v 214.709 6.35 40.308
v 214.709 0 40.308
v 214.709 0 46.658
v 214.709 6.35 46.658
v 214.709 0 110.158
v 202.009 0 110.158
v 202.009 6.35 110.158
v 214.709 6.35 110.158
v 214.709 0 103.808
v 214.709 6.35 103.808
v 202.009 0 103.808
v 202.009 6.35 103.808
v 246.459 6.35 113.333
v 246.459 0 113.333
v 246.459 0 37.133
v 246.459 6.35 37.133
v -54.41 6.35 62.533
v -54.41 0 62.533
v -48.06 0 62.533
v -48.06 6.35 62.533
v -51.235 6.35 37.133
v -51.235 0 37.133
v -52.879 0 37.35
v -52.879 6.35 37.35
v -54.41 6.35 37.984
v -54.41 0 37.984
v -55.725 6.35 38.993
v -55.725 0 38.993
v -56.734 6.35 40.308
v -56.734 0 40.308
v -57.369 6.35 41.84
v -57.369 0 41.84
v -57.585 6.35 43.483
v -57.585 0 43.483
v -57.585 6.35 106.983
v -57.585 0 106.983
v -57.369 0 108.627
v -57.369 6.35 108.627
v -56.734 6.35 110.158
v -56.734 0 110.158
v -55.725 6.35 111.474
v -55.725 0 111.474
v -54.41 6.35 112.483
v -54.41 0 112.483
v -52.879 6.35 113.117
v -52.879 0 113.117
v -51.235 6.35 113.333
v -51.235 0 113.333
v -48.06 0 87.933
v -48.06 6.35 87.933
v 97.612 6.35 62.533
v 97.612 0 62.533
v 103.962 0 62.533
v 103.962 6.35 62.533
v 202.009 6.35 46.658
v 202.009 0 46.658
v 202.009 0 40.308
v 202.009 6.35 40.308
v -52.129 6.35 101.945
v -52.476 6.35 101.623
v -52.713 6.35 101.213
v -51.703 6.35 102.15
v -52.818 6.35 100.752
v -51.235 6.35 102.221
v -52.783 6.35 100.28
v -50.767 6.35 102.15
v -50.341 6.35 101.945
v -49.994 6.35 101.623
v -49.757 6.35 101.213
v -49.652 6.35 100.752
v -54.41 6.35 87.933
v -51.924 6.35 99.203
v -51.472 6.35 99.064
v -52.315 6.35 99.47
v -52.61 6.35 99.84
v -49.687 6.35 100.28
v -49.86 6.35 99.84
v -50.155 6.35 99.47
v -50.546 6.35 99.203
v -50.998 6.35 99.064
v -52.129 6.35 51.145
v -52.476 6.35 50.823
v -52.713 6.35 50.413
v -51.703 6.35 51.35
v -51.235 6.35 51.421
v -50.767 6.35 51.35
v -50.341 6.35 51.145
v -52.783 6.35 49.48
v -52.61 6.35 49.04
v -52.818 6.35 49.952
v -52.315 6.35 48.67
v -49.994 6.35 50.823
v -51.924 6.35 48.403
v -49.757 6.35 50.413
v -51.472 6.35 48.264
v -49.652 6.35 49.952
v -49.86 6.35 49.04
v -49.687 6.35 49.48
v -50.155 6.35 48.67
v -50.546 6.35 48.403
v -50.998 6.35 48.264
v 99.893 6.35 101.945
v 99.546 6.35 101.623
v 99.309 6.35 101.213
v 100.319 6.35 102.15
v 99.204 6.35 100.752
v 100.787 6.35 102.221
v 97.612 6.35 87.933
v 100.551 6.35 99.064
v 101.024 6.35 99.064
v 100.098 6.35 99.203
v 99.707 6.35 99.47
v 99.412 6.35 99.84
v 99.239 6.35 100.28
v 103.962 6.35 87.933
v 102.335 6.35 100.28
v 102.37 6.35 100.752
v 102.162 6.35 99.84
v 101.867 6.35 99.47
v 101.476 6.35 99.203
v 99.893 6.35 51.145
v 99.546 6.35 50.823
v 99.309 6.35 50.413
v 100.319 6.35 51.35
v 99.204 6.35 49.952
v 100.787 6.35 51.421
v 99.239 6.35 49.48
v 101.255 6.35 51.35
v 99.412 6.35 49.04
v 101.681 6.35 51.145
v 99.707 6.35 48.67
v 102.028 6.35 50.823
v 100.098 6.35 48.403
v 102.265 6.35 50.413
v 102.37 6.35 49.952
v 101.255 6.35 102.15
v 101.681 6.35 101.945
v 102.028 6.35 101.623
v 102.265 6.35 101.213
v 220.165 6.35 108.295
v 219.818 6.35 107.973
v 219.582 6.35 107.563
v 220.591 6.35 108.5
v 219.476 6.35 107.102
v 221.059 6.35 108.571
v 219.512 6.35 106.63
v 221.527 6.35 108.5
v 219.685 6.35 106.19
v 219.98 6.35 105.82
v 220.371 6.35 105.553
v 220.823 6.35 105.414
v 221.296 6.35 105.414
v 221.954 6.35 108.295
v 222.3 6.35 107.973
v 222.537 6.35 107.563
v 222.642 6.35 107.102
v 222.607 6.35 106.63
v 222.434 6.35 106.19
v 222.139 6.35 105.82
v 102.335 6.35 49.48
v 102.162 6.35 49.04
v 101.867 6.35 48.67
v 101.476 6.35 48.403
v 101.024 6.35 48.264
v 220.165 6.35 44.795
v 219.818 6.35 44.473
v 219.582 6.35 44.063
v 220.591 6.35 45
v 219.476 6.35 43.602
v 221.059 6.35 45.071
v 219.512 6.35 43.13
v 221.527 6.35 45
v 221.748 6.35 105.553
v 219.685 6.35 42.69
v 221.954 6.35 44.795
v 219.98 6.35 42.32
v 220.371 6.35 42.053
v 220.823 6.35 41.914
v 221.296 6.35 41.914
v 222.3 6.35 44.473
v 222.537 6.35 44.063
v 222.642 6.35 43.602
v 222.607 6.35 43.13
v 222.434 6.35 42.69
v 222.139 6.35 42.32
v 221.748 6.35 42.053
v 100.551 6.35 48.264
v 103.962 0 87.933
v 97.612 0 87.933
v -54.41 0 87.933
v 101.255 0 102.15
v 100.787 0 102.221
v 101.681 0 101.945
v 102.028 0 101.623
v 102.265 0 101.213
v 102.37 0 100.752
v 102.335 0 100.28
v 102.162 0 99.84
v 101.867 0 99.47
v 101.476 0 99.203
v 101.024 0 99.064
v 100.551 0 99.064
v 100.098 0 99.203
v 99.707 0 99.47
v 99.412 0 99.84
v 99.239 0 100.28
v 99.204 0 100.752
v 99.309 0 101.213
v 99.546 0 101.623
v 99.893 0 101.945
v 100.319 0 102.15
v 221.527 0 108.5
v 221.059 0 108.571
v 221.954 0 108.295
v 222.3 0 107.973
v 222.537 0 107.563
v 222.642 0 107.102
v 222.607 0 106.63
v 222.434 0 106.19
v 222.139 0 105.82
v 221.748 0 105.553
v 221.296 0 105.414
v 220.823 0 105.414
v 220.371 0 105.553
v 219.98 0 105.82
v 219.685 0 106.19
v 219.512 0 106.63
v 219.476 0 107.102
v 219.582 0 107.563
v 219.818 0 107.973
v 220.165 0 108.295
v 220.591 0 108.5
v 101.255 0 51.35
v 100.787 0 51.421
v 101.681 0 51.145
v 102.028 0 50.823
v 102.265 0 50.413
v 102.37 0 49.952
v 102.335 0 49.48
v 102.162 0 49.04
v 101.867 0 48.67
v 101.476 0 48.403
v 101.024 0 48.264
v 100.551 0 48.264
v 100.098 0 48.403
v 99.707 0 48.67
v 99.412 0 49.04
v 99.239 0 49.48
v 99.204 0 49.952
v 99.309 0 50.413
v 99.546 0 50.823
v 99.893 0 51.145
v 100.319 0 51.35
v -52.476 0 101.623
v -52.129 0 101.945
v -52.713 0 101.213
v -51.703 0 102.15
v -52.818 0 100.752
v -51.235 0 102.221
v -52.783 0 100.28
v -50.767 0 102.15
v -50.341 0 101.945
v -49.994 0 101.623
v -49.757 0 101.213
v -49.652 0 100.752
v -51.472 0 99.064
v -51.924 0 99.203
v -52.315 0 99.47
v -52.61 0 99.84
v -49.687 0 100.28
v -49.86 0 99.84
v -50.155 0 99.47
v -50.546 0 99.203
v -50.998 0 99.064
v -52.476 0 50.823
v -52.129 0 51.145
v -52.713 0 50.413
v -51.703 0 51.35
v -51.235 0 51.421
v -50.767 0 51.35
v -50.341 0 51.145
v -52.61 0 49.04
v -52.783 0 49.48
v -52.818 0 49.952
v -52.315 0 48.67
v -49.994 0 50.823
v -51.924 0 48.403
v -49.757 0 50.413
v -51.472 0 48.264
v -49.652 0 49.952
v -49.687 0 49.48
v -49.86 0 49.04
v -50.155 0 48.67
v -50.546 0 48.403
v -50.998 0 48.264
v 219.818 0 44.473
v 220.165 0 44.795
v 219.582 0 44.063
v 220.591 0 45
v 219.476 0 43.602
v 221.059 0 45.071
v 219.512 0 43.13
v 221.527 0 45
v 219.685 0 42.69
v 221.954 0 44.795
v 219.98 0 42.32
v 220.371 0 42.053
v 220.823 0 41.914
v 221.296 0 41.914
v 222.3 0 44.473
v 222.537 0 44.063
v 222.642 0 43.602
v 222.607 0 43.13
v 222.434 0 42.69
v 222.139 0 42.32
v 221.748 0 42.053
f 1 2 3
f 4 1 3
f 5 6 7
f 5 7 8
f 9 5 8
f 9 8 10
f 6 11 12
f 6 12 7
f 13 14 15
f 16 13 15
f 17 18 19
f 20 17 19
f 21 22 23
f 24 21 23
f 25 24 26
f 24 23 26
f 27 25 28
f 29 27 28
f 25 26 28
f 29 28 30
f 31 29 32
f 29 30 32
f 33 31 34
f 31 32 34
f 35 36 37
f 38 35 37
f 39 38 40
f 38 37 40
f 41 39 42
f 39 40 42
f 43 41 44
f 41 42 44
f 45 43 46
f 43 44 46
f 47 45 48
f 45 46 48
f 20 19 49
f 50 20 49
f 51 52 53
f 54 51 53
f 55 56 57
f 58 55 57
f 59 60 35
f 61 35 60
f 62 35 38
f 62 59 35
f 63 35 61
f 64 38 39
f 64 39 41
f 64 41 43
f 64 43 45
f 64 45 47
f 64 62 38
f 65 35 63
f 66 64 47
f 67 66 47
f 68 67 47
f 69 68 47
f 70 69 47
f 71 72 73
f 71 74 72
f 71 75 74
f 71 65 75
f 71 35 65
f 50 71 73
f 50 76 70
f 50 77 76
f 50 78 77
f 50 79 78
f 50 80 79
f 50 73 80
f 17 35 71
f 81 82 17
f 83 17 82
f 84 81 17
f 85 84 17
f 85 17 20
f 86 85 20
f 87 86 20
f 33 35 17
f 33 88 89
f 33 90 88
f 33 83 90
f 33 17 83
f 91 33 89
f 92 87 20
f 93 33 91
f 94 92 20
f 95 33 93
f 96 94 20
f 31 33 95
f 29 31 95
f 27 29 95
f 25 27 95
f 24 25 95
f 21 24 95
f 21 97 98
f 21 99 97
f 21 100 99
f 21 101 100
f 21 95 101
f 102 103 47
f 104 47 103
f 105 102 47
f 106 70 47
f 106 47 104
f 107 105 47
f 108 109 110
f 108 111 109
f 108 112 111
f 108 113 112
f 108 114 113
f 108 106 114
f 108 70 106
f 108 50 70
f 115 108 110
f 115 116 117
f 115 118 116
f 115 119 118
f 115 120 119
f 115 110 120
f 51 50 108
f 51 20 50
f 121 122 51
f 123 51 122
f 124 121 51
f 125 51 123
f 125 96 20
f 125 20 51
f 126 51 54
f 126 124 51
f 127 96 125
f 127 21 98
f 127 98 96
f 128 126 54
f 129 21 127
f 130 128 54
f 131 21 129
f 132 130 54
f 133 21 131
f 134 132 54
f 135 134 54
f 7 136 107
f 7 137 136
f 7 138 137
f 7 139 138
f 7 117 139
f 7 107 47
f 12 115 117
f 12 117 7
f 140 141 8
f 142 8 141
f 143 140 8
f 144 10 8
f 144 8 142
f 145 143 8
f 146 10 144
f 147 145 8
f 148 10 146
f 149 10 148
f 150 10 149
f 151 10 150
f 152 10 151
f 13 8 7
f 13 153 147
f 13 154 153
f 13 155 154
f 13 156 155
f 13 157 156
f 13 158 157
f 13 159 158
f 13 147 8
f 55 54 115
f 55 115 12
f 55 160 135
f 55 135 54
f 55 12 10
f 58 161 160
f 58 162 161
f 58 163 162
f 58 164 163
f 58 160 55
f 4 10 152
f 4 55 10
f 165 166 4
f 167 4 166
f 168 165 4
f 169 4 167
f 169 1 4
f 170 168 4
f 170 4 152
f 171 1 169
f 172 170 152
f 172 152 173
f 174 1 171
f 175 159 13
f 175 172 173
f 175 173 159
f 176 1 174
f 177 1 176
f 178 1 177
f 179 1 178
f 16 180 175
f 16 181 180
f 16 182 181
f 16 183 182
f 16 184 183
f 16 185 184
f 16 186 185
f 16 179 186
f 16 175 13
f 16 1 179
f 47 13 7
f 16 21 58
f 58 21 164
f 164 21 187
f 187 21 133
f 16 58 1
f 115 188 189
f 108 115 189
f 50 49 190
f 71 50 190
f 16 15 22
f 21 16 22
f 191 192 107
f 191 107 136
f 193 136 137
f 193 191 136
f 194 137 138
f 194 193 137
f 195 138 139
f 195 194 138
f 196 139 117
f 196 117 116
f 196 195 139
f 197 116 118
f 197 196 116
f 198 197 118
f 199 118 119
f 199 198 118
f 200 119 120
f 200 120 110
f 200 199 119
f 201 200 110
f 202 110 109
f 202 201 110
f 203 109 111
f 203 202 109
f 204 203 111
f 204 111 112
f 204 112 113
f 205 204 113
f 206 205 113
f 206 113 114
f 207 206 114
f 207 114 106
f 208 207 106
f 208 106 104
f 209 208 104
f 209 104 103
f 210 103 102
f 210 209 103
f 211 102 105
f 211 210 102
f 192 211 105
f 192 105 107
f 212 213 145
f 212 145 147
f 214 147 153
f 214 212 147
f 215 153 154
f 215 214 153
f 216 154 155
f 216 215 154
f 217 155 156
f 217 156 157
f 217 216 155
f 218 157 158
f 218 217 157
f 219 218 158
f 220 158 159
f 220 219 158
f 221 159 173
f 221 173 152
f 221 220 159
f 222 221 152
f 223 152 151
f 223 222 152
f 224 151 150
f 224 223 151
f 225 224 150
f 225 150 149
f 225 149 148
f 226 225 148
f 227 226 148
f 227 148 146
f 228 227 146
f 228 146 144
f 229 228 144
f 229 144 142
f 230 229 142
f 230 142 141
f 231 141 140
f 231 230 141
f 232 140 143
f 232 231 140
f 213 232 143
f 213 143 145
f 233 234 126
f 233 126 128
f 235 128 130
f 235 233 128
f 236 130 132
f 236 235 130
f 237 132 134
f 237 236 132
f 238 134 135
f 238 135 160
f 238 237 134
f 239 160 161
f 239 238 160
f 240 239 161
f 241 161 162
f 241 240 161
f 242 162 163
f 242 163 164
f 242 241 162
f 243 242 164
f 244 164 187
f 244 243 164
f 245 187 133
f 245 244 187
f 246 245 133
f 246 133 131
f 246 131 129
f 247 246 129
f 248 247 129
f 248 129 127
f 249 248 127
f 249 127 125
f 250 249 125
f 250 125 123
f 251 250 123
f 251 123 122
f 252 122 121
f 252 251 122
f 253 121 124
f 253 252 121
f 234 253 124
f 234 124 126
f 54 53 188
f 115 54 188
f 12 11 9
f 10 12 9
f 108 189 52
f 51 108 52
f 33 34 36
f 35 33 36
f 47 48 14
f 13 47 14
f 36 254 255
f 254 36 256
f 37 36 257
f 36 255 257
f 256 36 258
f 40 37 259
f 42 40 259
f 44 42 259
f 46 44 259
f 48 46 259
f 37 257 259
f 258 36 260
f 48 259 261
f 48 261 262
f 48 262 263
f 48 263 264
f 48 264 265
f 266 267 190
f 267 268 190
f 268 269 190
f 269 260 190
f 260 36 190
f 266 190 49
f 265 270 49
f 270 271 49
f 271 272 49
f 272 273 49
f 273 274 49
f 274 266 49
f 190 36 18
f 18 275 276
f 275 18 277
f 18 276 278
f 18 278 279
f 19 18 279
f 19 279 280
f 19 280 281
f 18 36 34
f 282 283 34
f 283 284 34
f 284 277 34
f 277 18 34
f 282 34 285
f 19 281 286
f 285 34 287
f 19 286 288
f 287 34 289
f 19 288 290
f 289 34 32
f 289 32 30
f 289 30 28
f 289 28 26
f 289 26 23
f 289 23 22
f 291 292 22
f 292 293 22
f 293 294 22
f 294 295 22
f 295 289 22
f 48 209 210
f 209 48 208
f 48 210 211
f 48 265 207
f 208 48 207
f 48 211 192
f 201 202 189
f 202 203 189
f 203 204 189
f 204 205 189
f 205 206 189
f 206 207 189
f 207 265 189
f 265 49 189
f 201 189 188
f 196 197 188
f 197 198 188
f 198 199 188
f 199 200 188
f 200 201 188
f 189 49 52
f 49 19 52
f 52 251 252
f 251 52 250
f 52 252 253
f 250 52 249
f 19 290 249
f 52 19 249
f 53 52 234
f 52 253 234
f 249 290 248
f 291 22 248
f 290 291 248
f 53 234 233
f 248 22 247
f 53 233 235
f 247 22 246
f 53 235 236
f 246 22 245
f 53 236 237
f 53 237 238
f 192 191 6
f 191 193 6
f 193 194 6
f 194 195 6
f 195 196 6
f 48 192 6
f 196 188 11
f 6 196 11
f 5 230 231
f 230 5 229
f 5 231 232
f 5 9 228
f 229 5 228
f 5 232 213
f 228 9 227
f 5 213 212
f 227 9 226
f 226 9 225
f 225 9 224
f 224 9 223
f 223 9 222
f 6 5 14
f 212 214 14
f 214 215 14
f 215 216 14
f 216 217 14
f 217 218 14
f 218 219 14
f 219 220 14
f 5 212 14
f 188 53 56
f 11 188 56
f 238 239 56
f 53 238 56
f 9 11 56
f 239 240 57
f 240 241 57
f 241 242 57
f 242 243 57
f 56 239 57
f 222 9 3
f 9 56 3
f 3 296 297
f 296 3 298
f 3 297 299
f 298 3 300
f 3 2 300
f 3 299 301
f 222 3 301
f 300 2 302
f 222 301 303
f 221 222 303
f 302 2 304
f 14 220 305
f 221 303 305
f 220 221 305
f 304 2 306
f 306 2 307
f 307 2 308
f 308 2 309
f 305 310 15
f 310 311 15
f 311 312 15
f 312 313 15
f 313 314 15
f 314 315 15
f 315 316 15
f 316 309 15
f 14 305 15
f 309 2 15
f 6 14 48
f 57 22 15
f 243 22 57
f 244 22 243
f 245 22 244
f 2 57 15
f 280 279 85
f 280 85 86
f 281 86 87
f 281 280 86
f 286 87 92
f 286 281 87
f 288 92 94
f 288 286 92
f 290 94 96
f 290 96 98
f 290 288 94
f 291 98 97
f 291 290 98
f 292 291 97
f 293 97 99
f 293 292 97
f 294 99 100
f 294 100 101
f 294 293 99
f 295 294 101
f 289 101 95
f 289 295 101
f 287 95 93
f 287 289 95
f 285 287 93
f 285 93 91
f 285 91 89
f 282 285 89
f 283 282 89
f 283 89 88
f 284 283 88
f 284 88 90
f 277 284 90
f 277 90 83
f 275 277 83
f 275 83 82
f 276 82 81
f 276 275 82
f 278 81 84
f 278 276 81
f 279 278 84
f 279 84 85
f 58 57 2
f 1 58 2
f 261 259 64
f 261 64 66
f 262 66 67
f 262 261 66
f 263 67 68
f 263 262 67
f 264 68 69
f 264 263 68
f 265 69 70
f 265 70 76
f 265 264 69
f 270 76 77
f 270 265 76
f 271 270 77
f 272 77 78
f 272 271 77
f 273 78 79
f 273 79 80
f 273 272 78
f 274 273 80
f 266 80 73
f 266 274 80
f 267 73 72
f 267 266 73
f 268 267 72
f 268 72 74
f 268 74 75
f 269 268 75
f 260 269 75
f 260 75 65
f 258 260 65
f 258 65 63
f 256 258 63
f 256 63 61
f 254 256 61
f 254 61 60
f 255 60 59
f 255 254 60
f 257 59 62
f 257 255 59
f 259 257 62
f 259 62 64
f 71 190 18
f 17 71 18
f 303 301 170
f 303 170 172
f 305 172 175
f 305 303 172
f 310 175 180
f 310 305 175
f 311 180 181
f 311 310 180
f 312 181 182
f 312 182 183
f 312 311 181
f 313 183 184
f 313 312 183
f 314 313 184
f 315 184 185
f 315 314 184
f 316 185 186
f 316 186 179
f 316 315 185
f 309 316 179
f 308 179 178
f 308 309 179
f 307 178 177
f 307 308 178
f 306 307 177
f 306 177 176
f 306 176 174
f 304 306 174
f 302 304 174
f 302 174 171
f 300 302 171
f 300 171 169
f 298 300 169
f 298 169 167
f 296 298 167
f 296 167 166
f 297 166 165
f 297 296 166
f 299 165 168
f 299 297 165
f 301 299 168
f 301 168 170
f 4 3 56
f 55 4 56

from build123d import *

# Parameters (mm, degrees)
SKETCH1_R           = 1.5875
BOSS_EXTRUDE1_DEPTH = 6.35


with BuildPart() as part:
    # Sketch1 → Boss-Extrude1 (new body)
    with BuildSketch(Plane(origin=(0, 0, 0), x_dir=(1, 0, 0), z_dir=(0, 1, 0))):
        with BuildLine():
            Line((-51.235076938, -113.333409223), (246.459341535, -113.333409223))
            Line((246.459341535, -113.333409223), (246.459341535, -37.133409223))
            Line((246.459341535, -37.133409223), (-51.235076938, -37.133409223))
            ThreePointArc((-51.235076938, -37.133409223), (-55.725204999, -38.993281163), (-57.585076938, -43.483409223))
            Line((-57.585076938, -43.483409223), (-57.585076938, -106.983409223))
            ThreePointArc((-57.585076938, -106.983409223), (-55.725204999, -111.473537284), (-51.235076938, -113.333409223))
        make_face()
        with Locations(Location((-51.235076938, -100.633409223, 0), (0, 0, 270))):
            Circle(SKETCH1_R, mode=Mode.SUBTRACT)
        with Locations(Location((-51.235076938, -49.833409223, 0), (0, 0, 270))):
            Circle(SKETCH1_R, mode=Mode.SUBTRACT)
        with Locations(Location((100.787132298, -100.633409223, 0), (0, 0, 270))):
            Circle(SKETCH1_R, mode=Mode.SUBTRACT)
        with Locations(Location((100.787132298, -49.833409223, 0), (0, 0, 270))):
            Circle(SKETCH1_R, mode=Mode.SUBTRACT)
        with Locations(Location((221.059341535, -106.983409223, 0), (0, 0, 270))):
            Circle(SKETCH1_R, mode=Mode.SUBTRACT)
        with Locations(Location((221.059341535, -43.483409223, 0), (0, 0, 270))):
            Circle(SKETCH1_R, mode=Mode.SUBTRACT)
        Polygon((-54.410076938, -75.233409223), (-54.410076938, -62.533409223), (-48.060076938, -62.533409223), (-48.060076938, -87.933409223), (-54.410076938, -87.933409223), align=None, mode=Mode.SUBTRACT)
        Polygon((97.612132298, -75.233409223), (97.612132298, -62.533409223), (103.962132298, -62.533409223), (103.962132298, -87.933409223), (97.612132298, -87.933409223), align=None, mode=Mode.SUBTRACT)
        Polygon((208.359341535, -103.808409223), (202.009341535, -103.808409223), (202.009341535, -110.158409223), (214.709341535, -110.158409223), (214.709341535, -103.808409223), align=None, mode=Mode.SUBTRACT)
        Polygon((208.359341535, -46.658409223), (202.009341535, -46.658409223), (202.009341535, -40.308409223), (214.709341535, -40.308409223), (214.709341535, -46.658409223), align=None, mode=Mode.SUBTRACT)
    extrude(amount=BOSS_EXTRUDE1_DEPTH)


solid = part.part
